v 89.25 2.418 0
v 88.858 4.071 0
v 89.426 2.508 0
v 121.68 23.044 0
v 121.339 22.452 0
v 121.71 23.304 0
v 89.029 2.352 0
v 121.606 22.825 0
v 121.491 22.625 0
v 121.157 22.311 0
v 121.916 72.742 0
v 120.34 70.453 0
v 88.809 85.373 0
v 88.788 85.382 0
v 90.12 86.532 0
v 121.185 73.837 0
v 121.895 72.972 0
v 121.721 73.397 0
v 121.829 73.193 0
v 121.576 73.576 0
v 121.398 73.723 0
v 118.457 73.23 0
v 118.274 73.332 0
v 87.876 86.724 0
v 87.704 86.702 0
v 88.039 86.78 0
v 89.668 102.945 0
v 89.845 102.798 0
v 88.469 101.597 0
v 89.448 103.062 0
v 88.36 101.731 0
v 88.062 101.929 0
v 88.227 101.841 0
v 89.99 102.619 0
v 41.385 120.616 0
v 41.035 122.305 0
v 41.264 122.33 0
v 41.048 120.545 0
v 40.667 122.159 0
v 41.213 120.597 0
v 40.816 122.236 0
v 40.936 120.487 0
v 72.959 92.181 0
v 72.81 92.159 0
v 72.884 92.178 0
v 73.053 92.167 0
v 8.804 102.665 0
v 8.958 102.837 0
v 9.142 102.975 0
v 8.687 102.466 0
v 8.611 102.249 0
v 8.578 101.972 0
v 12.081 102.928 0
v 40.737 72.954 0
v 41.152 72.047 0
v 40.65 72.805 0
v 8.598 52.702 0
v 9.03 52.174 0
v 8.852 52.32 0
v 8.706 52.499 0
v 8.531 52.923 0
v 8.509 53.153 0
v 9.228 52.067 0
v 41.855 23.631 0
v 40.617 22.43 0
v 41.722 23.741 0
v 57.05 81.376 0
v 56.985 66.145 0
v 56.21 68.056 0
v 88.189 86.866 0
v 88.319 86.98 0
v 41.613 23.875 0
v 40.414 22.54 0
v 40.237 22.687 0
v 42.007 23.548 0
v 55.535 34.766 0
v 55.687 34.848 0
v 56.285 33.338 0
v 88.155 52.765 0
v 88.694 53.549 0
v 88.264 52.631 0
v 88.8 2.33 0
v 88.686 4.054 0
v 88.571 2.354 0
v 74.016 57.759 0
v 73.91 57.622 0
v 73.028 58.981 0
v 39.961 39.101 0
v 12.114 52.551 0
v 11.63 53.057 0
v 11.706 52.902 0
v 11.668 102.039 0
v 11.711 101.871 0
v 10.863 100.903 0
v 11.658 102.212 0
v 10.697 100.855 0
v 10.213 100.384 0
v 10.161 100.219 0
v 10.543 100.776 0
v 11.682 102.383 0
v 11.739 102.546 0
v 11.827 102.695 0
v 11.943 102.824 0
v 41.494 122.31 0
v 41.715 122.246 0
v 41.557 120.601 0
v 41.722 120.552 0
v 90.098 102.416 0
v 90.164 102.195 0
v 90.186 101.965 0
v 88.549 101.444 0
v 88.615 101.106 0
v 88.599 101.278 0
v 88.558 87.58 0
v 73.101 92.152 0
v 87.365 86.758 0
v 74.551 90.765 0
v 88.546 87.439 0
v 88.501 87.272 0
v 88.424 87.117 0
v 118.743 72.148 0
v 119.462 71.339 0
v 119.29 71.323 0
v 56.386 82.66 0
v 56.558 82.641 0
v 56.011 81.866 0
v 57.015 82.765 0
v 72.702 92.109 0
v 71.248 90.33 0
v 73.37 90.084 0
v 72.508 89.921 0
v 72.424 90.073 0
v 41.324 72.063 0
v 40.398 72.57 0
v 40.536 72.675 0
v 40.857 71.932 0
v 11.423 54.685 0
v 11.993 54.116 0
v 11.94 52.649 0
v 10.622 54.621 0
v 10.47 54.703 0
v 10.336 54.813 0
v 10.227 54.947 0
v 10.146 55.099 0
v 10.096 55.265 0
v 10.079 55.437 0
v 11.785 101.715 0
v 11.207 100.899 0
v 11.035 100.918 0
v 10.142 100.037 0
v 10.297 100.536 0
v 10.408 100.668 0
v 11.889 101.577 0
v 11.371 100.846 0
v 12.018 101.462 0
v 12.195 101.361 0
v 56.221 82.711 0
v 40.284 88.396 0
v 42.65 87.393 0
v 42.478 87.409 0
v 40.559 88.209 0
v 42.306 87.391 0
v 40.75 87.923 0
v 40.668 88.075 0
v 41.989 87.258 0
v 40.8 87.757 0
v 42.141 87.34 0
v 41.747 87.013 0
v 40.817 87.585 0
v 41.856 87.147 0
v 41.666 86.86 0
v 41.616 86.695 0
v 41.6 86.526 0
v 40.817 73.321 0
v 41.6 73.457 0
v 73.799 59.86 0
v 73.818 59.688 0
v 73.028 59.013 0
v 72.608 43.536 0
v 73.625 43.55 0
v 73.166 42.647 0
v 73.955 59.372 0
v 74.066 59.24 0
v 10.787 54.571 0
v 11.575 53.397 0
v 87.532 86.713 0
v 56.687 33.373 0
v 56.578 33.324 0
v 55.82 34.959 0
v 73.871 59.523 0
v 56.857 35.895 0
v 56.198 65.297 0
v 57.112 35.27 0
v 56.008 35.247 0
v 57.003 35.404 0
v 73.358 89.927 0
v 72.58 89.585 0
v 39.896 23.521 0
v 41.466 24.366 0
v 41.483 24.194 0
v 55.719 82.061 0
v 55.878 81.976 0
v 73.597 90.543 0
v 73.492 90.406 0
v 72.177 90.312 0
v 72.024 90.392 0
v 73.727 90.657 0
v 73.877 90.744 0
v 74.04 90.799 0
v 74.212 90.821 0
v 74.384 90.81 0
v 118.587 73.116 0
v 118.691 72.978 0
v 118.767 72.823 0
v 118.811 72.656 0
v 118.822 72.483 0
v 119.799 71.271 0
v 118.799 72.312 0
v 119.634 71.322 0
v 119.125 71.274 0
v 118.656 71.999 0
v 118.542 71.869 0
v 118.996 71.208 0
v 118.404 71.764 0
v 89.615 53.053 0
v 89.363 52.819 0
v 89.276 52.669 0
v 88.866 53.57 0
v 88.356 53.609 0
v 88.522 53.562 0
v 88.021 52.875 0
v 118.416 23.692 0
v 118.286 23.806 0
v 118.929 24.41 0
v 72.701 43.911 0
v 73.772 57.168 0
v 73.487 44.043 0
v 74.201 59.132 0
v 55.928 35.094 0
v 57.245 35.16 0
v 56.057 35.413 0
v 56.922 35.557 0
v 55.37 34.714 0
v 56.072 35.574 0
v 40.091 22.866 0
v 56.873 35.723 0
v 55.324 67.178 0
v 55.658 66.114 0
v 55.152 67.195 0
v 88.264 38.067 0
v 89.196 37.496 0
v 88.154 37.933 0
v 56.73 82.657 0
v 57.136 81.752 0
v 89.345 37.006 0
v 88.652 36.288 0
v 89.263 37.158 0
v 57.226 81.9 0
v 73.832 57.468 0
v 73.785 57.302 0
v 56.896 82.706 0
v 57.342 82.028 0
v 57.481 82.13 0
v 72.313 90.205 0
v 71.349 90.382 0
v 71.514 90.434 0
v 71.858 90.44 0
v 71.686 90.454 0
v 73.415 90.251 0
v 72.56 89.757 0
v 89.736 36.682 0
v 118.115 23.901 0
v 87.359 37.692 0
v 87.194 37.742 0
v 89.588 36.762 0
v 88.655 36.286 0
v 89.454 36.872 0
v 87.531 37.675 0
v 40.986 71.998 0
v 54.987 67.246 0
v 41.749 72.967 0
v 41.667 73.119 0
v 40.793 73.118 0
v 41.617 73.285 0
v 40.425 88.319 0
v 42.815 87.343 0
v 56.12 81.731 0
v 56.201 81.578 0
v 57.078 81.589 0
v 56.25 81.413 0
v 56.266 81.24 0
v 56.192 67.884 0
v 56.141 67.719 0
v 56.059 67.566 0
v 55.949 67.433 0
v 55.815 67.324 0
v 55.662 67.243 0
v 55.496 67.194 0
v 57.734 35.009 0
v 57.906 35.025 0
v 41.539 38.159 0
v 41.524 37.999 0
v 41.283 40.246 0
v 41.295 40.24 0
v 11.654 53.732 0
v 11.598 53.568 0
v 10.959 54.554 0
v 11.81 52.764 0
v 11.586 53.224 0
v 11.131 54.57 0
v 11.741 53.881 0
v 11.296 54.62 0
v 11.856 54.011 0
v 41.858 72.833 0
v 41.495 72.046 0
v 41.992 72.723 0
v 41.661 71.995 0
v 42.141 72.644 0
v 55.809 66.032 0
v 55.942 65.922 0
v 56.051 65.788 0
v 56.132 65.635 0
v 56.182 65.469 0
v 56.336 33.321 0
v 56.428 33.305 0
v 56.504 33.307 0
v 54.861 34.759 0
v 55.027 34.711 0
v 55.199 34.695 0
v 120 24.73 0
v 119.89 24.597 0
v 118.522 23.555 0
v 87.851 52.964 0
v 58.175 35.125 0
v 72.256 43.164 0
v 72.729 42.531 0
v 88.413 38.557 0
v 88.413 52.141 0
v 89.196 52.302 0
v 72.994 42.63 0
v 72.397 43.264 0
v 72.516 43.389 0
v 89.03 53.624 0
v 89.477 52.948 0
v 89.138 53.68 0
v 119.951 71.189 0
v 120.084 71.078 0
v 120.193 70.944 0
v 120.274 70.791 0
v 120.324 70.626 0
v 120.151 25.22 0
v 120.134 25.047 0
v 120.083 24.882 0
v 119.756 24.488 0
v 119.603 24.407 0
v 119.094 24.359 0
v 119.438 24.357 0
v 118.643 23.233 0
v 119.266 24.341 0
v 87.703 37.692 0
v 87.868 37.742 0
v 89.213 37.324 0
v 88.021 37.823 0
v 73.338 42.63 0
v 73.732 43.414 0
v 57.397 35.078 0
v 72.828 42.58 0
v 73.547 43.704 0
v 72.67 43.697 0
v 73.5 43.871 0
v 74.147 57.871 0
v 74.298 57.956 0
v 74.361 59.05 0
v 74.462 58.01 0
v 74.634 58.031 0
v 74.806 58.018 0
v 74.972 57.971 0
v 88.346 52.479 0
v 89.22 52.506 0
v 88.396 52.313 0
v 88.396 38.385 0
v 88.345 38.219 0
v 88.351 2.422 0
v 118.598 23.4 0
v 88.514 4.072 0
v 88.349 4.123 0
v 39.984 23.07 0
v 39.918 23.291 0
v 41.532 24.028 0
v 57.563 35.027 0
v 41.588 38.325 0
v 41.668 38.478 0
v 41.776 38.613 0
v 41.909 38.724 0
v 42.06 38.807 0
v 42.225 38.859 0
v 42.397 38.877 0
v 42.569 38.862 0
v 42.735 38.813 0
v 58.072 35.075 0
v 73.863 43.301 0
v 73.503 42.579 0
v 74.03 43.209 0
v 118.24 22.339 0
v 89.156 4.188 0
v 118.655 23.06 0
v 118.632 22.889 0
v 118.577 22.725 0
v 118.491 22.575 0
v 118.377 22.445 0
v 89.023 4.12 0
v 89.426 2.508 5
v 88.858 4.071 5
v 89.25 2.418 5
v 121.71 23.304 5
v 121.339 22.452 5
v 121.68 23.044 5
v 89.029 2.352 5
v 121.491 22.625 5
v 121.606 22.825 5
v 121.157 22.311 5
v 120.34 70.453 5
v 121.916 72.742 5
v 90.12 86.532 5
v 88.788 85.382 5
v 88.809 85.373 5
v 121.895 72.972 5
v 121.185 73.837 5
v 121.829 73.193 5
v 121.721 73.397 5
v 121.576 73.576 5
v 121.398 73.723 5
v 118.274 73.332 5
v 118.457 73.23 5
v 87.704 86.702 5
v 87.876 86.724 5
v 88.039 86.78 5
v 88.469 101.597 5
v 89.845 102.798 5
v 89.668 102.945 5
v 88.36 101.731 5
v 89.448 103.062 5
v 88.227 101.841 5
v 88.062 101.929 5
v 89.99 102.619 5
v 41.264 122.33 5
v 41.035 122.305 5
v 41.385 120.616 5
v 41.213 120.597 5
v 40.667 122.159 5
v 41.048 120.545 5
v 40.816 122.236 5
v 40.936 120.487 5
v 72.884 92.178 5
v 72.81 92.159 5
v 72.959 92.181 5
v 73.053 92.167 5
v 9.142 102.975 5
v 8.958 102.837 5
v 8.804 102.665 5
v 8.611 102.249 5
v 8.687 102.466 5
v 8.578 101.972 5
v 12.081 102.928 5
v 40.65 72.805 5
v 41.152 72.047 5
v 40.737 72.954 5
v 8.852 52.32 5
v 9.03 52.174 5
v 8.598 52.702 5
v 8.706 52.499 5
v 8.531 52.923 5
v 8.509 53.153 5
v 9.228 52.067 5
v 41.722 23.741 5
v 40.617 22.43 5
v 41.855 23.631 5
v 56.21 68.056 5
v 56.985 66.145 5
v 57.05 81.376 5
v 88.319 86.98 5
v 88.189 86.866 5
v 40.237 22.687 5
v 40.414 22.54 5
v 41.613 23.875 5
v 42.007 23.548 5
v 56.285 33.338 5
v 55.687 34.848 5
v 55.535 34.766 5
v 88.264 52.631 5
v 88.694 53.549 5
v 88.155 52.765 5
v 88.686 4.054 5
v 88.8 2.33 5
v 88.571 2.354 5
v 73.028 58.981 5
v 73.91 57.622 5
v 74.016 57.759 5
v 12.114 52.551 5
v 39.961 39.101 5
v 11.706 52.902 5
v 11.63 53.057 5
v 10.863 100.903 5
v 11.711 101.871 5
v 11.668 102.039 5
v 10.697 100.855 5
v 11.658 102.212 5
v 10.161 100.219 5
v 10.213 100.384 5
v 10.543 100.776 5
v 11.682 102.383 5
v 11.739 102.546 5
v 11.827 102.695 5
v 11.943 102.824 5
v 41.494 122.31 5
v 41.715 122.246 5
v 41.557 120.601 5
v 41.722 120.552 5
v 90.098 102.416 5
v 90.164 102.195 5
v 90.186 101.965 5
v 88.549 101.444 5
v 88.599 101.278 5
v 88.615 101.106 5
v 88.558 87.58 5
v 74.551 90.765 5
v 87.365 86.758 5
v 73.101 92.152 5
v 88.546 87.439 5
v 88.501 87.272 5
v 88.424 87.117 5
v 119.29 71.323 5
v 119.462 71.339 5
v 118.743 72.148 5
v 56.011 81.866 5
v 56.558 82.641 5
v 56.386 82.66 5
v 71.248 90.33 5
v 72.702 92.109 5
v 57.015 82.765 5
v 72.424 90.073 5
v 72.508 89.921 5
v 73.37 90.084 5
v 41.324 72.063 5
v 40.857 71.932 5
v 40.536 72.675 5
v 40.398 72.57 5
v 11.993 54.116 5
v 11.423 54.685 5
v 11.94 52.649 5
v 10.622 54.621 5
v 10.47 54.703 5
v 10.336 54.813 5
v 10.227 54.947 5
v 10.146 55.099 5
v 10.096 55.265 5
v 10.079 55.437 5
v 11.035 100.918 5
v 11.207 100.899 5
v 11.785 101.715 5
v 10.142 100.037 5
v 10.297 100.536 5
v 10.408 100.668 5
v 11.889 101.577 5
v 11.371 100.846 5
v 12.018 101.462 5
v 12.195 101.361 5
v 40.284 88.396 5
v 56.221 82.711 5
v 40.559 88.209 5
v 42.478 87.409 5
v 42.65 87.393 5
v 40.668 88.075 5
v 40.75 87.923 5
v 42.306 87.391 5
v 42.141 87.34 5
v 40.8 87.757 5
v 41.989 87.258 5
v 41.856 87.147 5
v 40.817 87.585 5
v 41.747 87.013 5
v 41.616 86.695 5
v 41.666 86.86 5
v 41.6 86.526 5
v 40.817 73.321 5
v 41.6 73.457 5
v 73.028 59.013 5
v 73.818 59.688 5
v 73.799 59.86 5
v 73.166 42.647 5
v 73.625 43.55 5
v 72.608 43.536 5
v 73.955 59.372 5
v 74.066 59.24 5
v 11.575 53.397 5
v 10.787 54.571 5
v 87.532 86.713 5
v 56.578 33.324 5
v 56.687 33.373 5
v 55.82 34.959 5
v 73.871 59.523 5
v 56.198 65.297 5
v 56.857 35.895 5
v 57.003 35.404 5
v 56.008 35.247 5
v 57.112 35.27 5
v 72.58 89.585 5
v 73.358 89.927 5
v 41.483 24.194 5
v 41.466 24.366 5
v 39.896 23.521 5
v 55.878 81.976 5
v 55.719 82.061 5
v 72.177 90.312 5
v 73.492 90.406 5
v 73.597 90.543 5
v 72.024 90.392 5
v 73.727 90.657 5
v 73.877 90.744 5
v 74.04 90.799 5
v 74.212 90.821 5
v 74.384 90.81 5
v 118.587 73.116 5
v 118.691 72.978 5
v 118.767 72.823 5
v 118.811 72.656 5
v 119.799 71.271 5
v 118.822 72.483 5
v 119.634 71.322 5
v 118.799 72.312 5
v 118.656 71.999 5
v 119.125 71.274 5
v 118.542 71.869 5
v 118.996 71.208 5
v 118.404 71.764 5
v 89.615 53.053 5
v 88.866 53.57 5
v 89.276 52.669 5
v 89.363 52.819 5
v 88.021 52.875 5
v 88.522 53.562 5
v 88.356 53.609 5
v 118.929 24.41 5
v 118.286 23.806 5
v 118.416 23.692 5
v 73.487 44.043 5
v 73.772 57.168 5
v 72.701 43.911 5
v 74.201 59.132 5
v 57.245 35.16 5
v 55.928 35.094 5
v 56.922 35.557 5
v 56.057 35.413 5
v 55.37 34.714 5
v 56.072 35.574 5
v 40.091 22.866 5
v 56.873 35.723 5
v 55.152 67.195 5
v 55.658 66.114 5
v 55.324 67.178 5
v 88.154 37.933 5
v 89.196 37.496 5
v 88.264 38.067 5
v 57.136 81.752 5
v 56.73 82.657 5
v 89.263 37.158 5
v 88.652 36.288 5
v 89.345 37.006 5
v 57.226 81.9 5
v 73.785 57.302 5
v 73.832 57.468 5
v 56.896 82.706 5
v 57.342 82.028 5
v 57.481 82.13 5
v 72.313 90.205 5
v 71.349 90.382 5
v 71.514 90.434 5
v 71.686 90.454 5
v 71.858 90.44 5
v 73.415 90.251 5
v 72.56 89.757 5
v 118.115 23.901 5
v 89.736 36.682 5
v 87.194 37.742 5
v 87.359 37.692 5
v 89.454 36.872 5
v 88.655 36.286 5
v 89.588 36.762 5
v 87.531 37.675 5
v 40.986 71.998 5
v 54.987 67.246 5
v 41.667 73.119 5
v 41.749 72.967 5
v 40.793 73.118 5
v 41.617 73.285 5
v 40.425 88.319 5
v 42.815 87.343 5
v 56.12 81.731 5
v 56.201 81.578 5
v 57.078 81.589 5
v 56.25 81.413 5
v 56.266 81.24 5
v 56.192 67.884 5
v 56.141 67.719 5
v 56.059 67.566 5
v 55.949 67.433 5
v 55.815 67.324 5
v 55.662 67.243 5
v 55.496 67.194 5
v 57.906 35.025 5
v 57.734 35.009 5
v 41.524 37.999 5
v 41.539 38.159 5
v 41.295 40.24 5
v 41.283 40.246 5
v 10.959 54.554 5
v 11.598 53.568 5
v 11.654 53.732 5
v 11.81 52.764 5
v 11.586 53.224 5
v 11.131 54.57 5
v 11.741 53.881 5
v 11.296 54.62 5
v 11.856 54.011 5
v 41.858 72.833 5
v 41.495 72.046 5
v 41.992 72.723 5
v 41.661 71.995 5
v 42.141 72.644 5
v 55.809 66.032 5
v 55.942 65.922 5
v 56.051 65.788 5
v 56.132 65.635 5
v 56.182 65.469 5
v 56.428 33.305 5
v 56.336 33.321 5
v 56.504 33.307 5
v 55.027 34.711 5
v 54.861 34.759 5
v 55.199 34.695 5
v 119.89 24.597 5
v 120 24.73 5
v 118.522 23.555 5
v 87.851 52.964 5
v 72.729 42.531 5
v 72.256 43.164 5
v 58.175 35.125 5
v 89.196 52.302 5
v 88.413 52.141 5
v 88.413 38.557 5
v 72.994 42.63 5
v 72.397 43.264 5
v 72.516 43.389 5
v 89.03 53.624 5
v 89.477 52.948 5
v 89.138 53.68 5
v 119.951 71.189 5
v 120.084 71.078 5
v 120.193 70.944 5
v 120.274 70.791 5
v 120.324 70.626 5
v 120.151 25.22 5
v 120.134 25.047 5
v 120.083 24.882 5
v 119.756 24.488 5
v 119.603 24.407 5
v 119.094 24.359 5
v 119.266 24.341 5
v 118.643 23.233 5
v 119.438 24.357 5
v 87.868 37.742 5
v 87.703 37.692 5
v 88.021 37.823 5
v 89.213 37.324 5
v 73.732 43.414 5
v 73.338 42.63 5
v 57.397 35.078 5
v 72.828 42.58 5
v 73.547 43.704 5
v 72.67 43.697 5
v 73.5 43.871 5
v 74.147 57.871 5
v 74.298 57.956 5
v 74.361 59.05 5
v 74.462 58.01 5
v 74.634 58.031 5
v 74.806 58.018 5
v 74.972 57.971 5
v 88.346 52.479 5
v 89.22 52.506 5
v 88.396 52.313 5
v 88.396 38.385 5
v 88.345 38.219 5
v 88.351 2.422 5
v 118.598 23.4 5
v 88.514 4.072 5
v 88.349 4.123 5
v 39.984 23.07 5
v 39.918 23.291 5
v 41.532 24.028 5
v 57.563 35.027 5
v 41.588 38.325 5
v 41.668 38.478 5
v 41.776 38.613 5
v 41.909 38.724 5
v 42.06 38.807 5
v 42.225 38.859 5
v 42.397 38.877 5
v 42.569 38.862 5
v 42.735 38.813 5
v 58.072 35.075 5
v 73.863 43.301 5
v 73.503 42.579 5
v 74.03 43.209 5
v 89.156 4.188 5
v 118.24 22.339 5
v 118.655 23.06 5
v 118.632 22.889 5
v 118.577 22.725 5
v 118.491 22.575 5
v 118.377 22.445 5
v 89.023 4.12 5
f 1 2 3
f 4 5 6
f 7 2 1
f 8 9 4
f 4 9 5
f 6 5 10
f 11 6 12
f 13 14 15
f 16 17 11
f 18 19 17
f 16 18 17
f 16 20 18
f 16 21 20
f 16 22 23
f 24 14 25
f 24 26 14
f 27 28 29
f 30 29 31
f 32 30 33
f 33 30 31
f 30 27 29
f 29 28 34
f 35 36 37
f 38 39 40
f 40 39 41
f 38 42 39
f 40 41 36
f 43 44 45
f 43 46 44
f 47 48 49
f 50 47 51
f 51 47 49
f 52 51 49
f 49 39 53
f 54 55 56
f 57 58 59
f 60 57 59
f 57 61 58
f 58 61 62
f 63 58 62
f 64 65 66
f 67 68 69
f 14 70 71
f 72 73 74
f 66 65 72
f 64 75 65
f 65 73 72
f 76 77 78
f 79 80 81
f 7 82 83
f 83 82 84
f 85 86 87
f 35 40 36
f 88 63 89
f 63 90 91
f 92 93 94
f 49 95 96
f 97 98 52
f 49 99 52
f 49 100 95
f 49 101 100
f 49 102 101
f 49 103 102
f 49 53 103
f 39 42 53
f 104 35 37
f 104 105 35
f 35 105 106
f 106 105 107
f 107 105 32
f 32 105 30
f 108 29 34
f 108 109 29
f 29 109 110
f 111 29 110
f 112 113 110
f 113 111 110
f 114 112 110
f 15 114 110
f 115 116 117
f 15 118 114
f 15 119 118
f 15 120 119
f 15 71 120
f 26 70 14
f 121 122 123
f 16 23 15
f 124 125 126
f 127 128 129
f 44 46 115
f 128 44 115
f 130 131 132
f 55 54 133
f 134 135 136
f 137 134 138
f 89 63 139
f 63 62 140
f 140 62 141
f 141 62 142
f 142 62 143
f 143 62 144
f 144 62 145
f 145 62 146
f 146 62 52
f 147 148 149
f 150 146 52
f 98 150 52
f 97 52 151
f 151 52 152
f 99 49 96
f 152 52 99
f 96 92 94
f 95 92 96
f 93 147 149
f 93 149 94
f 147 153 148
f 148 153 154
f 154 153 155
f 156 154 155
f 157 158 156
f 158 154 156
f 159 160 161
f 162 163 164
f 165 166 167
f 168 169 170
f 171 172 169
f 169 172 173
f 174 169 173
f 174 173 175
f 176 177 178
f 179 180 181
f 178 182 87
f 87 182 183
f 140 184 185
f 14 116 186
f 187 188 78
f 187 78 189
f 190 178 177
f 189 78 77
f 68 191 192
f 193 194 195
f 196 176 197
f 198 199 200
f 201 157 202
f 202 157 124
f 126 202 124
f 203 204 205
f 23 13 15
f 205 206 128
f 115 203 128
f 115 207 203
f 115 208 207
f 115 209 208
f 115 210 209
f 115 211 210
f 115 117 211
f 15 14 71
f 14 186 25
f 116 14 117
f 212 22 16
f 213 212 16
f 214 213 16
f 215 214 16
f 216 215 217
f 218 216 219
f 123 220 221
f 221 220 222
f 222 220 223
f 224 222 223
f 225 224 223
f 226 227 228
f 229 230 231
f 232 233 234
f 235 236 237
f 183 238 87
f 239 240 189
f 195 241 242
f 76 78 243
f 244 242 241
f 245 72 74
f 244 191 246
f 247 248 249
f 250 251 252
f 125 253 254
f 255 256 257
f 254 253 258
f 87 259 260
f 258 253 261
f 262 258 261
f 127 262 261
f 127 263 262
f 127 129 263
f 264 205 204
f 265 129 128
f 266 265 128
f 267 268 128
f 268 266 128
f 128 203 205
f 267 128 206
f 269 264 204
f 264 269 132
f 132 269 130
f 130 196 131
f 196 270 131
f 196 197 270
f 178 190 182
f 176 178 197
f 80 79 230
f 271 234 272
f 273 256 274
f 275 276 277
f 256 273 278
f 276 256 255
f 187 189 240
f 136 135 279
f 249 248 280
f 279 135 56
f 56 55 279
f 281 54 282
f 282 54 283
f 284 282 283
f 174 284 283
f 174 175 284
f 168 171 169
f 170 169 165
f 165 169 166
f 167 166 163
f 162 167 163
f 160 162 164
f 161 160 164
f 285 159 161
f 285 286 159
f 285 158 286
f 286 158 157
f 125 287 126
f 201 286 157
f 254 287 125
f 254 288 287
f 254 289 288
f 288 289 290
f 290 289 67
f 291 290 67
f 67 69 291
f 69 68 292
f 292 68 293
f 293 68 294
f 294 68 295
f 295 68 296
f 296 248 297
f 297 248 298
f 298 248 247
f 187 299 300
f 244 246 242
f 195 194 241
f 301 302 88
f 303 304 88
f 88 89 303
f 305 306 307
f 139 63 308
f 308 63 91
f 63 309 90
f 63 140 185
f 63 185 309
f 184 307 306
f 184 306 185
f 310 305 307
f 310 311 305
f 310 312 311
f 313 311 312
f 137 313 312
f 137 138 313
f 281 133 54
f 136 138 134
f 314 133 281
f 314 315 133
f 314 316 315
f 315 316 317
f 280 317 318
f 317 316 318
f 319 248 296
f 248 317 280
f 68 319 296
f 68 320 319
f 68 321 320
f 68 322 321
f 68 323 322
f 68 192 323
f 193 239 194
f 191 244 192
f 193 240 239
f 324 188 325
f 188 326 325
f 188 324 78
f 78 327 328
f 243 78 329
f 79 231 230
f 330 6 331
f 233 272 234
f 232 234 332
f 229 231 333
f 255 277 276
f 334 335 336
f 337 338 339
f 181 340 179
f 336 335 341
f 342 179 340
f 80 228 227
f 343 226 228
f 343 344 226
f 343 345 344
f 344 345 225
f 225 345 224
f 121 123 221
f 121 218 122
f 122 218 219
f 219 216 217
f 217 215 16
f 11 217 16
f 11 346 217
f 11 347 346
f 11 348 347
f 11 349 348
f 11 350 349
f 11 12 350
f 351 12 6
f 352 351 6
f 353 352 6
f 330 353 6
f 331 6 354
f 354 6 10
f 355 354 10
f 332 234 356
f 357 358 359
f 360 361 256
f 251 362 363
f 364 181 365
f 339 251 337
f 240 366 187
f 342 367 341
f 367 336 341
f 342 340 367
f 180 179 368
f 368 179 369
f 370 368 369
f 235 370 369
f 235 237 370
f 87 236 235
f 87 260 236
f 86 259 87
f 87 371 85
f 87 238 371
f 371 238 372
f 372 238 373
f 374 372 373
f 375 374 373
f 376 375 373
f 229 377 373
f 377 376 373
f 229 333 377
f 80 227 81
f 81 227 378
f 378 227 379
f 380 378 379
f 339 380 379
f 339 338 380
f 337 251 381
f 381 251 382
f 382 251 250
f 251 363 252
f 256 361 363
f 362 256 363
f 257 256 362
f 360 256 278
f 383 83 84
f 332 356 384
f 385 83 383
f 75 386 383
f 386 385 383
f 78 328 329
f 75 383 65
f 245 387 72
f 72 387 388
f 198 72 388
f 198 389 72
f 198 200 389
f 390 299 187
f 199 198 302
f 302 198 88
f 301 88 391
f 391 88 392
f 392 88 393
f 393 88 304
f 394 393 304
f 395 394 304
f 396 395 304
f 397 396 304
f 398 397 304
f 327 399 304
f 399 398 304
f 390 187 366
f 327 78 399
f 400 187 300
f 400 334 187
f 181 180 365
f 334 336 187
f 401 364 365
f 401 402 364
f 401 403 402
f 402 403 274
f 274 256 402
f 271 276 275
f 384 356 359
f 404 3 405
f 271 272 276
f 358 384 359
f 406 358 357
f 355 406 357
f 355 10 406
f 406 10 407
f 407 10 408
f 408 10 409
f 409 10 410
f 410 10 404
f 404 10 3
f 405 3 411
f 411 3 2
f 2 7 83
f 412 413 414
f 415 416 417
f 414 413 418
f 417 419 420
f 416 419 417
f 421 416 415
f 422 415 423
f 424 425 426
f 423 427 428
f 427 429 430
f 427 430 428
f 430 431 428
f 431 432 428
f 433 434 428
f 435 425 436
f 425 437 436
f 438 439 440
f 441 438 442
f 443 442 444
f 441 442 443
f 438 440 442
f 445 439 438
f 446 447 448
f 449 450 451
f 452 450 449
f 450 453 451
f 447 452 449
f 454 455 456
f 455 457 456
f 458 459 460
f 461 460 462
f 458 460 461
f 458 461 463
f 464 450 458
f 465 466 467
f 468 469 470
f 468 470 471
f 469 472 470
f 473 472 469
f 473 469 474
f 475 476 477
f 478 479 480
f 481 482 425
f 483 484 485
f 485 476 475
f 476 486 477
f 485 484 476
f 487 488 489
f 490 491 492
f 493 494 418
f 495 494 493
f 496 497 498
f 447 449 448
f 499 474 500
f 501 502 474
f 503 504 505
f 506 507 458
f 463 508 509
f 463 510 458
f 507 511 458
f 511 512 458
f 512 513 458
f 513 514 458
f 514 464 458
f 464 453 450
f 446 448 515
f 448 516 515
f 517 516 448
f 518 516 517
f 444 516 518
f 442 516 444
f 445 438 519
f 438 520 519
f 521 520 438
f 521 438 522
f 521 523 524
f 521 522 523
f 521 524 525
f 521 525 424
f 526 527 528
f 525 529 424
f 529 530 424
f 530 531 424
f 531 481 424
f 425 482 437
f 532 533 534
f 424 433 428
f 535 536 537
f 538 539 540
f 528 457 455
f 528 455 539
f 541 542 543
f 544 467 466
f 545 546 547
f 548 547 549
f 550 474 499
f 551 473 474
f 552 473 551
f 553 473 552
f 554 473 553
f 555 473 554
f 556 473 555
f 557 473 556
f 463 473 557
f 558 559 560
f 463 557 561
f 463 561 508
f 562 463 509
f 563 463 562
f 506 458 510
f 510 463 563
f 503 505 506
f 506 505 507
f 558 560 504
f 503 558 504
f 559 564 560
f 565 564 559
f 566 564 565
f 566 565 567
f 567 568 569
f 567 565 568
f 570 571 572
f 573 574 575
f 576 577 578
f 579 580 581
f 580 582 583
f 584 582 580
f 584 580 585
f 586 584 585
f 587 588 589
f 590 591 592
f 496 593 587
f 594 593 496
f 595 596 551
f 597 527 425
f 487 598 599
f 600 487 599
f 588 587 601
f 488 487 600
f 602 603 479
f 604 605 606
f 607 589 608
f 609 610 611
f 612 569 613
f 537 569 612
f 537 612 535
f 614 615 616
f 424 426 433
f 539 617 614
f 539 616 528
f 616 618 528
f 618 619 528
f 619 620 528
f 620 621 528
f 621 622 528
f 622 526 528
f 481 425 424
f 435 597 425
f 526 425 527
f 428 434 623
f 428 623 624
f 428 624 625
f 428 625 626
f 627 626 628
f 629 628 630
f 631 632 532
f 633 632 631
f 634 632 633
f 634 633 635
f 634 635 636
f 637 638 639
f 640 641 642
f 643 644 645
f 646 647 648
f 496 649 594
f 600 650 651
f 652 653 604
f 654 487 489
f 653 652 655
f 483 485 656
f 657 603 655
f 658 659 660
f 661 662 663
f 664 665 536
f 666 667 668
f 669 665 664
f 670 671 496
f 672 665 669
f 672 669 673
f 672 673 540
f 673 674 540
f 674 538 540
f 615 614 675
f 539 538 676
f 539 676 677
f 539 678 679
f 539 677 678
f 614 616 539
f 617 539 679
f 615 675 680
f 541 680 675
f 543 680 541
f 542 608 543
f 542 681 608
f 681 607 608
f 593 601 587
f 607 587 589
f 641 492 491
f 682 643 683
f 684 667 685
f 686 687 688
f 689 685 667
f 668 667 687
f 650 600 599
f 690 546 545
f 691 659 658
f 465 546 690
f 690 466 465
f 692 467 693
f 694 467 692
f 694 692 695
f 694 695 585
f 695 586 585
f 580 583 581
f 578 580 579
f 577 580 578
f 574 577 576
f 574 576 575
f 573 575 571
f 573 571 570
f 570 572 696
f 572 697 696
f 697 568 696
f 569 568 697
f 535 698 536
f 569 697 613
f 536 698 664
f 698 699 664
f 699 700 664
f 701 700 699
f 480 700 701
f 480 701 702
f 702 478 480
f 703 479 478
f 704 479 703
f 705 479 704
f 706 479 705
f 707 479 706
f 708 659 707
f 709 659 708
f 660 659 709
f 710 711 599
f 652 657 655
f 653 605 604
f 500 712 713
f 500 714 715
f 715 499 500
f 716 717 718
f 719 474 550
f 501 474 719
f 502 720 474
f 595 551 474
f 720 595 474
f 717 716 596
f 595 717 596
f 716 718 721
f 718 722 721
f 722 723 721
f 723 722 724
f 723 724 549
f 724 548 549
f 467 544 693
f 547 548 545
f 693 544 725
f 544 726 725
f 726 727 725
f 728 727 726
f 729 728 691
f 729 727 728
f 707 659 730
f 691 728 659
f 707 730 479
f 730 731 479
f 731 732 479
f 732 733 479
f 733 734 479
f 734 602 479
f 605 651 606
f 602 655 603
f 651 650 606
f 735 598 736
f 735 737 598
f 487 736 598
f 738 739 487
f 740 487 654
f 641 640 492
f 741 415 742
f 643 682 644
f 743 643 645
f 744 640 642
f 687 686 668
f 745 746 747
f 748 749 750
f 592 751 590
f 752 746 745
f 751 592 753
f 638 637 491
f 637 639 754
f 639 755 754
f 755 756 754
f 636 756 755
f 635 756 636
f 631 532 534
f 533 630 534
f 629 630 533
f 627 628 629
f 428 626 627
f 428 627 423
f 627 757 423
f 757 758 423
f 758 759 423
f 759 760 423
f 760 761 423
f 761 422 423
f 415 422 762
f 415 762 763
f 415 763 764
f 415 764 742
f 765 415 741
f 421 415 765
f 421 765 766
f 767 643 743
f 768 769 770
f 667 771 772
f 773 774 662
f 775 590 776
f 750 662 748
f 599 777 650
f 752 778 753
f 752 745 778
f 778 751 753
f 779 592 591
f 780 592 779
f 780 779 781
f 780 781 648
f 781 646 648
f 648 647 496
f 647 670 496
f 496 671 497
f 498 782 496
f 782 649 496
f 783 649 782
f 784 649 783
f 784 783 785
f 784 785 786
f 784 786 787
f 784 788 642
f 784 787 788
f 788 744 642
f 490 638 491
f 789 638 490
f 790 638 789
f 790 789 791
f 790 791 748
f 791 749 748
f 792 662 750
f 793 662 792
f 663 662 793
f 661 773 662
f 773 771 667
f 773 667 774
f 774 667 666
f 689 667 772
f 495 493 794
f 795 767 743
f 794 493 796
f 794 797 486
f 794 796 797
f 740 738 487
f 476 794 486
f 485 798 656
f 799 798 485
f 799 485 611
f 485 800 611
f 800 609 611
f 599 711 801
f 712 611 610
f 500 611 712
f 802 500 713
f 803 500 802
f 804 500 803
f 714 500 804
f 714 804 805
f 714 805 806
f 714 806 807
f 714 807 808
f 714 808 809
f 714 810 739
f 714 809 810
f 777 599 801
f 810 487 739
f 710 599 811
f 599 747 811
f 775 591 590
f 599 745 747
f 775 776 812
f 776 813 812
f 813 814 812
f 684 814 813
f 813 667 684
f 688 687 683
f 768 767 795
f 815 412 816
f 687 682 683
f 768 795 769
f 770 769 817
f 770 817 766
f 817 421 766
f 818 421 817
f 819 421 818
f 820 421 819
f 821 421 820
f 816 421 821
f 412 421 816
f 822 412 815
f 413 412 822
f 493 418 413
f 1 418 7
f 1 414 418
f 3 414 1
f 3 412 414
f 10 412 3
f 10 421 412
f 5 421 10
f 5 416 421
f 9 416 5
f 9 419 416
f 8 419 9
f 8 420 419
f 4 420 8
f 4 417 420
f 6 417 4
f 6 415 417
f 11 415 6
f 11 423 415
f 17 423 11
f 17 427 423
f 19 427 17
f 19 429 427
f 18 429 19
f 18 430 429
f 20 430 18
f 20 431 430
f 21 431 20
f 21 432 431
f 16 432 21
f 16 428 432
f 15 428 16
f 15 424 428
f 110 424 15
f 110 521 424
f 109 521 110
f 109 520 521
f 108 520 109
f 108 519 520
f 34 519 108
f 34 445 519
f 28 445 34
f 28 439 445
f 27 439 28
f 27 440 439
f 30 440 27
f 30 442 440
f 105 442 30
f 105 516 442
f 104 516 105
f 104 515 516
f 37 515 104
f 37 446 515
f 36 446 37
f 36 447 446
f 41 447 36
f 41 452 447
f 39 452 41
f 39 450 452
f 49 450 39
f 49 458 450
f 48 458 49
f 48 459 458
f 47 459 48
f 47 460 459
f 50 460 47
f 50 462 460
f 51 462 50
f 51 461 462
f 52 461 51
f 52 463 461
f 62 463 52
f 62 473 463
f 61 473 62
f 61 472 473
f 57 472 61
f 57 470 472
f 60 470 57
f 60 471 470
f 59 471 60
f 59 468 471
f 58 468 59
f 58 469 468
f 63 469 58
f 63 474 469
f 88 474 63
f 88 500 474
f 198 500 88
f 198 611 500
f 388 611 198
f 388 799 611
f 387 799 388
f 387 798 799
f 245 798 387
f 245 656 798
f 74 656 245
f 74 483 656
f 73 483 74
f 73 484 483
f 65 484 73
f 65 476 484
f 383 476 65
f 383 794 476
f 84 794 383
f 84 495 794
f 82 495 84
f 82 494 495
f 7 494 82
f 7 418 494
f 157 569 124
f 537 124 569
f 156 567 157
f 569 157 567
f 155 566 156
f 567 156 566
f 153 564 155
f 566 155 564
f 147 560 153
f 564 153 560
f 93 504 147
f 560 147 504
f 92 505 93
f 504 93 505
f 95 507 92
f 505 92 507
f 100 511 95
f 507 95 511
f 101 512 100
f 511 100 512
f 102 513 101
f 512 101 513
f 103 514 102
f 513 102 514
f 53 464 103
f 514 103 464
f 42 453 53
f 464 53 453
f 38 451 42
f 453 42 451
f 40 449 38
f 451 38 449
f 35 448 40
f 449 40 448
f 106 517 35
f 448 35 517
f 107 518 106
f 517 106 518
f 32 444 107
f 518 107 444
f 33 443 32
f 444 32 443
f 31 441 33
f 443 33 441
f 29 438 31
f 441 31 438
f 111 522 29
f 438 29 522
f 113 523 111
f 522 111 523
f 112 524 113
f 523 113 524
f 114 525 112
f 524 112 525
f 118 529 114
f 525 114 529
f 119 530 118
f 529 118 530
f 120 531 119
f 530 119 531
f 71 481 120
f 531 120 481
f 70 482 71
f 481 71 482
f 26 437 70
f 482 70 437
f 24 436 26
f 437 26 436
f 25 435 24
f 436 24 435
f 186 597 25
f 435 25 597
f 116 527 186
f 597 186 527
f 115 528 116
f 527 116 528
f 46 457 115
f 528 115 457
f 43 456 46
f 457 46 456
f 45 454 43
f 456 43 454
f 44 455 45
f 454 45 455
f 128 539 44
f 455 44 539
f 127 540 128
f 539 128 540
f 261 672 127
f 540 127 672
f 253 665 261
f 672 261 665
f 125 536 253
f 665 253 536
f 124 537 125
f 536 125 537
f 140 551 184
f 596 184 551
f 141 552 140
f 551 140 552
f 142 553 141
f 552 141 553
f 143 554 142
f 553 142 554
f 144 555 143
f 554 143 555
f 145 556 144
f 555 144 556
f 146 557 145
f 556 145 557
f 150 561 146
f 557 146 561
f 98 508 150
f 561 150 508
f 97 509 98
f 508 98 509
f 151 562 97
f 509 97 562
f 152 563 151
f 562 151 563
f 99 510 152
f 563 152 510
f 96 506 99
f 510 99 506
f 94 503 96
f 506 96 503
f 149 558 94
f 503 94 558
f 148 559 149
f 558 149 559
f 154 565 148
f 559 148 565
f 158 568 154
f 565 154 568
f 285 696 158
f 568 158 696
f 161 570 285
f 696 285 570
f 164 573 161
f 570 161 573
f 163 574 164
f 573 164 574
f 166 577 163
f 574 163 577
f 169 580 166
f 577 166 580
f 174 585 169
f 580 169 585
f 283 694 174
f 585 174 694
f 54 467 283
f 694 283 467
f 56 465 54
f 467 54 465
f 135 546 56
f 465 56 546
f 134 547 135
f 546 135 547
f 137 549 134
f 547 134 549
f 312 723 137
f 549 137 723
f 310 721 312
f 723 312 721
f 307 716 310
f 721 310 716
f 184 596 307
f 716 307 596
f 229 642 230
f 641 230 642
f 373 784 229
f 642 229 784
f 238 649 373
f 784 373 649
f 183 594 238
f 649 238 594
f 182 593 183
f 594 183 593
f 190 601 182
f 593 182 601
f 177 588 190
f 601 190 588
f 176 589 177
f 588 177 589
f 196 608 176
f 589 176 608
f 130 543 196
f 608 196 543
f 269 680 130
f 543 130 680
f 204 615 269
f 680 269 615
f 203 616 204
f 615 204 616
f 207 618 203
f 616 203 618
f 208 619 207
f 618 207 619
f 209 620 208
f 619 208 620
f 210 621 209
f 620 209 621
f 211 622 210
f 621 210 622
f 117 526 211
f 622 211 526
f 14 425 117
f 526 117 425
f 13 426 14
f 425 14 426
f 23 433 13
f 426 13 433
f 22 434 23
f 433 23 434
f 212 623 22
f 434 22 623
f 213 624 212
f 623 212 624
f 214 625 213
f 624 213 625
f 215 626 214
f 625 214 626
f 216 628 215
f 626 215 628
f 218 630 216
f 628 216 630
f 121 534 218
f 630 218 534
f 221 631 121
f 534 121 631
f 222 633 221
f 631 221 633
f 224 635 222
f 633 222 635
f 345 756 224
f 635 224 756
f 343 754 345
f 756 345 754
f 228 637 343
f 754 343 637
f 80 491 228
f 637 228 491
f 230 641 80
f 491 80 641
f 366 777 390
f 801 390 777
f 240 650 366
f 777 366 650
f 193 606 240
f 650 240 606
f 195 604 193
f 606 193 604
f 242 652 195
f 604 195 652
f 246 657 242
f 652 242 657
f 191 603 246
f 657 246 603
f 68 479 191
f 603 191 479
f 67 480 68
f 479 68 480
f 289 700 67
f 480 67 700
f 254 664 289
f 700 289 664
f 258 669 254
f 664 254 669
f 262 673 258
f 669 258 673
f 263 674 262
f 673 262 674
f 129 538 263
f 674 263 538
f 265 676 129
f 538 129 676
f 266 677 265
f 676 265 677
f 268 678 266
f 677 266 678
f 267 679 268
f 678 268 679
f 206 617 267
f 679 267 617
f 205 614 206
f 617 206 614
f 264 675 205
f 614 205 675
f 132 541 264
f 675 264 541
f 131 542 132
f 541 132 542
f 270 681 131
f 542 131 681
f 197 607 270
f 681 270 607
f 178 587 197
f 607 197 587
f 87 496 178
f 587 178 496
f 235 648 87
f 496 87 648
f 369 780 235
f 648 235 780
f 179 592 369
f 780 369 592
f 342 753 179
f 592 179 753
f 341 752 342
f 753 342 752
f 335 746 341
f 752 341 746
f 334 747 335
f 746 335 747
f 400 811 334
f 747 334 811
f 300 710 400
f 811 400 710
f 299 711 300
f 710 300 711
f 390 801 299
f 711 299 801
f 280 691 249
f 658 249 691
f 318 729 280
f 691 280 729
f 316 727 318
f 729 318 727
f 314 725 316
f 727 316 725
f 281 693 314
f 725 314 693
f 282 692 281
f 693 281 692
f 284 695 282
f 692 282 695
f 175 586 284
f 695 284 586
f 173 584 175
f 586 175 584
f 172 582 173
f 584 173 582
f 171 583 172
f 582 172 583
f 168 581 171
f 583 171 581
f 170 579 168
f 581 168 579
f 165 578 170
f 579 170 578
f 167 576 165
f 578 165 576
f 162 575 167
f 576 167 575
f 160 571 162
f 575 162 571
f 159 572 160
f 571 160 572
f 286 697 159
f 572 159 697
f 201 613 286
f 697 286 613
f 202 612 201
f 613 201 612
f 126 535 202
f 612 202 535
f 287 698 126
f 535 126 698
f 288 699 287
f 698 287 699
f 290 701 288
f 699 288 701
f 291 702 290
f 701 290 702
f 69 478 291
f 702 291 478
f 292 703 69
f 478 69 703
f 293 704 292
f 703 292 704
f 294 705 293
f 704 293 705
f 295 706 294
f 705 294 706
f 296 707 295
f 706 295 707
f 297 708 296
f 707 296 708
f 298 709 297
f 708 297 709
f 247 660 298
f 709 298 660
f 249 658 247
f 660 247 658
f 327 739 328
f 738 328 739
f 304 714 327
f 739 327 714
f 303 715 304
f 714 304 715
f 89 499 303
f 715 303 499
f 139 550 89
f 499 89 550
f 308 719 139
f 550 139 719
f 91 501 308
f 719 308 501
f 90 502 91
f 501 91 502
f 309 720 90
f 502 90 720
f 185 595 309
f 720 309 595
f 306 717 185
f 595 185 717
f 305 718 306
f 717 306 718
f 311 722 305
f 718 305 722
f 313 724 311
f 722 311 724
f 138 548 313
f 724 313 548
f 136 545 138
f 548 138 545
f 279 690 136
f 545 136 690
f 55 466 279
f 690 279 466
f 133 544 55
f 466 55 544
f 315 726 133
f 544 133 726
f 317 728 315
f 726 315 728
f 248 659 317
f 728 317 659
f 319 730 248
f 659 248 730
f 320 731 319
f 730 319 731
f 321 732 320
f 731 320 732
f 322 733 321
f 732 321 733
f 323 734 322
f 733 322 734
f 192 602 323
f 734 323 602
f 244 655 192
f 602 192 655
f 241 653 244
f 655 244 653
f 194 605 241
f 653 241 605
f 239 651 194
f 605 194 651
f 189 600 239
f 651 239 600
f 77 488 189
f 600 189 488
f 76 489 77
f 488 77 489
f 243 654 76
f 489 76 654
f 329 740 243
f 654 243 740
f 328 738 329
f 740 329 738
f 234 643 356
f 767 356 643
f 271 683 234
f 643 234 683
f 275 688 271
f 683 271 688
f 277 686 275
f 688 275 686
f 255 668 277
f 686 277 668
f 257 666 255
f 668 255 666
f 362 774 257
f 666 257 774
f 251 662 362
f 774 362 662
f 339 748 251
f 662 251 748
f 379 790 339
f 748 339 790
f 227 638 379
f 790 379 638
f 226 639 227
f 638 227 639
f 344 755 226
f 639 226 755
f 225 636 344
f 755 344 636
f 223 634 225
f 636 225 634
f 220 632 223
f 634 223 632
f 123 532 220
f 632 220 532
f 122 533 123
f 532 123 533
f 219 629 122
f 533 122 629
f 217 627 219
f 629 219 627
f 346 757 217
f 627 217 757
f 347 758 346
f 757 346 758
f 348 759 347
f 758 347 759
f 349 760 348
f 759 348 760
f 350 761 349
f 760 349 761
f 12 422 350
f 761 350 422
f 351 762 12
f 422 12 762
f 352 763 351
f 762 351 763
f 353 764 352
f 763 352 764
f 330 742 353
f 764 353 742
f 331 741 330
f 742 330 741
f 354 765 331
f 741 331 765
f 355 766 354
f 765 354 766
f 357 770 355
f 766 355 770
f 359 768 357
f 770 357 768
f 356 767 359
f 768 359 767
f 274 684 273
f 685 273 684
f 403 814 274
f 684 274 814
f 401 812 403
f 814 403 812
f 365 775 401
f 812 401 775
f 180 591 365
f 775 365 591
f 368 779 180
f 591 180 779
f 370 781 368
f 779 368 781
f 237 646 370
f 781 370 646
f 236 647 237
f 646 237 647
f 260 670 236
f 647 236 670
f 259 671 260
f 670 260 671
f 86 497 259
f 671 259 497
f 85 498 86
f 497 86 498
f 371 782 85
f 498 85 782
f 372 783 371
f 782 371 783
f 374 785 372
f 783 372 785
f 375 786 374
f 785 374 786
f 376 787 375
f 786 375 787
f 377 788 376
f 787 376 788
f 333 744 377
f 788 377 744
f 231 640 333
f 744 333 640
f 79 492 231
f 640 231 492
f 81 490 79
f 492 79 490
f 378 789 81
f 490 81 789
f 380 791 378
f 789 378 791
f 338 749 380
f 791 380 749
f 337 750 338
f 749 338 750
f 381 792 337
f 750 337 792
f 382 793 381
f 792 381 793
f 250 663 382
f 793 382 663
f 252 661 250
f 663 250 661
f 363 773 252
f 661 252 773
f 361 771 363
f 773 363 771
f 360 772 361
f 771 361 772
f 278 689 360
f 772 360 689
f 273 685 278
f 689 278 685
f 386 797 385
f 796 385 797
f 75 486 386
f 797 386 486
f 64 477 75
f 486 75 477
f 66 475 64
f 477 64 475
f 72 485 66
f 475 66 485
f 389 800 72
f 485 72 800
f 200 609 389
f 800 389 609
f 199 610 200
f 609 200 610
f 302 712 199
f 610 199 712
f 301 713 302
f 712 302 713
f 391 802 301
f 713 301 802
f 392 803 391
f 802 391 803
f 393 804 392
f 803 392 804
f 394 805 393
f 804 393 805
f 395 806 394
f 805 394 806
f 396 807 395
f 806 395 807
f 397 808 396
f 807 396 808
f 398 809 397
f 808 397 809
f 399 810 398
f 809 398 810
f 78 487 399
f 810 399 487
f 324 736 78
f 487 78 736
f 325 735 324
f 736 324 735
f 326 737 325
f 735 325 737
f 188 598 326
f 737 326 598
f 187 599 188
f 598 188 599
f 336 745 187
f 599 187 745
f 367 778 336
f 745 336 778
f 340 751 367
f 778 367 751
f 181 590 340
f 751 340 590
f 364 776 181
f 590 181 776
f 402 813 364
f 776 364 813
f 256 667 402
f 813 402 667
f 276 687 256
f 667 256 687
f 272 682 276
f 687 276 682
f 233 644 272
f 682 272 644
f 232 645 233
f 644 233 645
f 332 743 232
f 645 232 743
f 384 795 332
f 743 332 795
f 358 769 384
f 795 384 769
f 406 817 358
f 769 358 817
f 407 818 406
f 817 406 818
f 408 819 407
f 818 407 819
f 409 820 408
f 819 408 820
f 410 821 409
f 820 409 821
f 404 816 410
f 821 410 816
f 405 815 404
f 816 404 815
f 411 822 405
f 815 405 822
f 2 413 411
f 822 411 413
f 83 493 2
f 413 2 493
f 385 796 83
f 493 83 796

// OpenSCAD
/*
 * Customizable Geometry - Two Boxes https://www.thingiverse.com/thing:2776180
 * by Dennis Hofmann - https://www.thingiverse.com/mightynozzle/about
 * created 2018-01-31
 * version v1.0
 *
 * Changelog
 * --------------
 * v1.0:
 *      - final design
 * --------------
 * 
 * This work is licensed under the Creative Commons - Attribution - NonCommercial - ShareAlike license.
 * https://creativecommons.org/licenses/by-nc-sa/3.0/
 */


 // Parameter Section //
//-------------------//

// preview[view:north, tilt:top]

// The maximum size of the longest side. The shorter side will be automatically resized in same ratio.
max_size_in_millimeter = 120; //[20:300]

// The height of the model.
model_height_in_millimeter = 5; //[0.2:0.2:100]

// Thickness of the outer outline.
outline_size_in_millimeter = 1.6; //[0.5:0.1:20]

// Thickness of the inner outline.
inline_size_in_millimeter = 0.8; //[0.5:0.1:20]

// Roundiness of the ends of the inner outlines.
inline_edge_radius_in_millimeter = 0.9; //[0.0:0.1:5]

// Flip model
flip_model = "no"; //[yes,no]

/*[hidden]*/
max_size = max_size_in_millimeter;
model_height = model_height_in_millimeter;
$fn=32;

// Outer Points
A1 = [599, 580];
A2 = [598, 342];
A3 = [1293, 51];
A4 = [1755, 339];
A5 = [1758, 1058];
A6 = [1295, 1247];
A7 = [1296, 1483];
A8 = [601, 1762];
A9 = [142, 1483];
A10 = [141, 773];

outline = [A1, A2, A3, A4, A5, A6, A7, A8, A9, A10];

// Inner Points
B1 = [600, 1056];
B2 = [825, 1194];
B3 = [822, 490];
B4 = [1064, 628];
B5 = [1293, 771];
B6 = [1062, 1335];
B7 = [1293, 533];
B8 = [824, 962];
B9 = [1069, 858];
B10 = [600, 1286];

// Polygons
C1 = [A1, A2, A3, A4, B7, B4, B3];
C2 = [B4, B7, B5, B9];
C3 = [B7, A4, A5, B5];
C4 = [B5, A5, A6, B6, B9];
C5 = [B3, B4, B9, B6, B2, B8];
C6 = [B8, B1, B10, B2];
C7 = [B8, B3, A1, A10, B1];
C8 = [A10, A9, B10, B1];
C9 = [B2, B6, A6, A7, A8, A9];

cut_polygons = [C1, C2, C3, C4, C5, C6, C7, C8, C9];

min_x = A10[0];
min_y = A3[1];
max_x = A5[0];
max_y = A8[1];

x_size = max_x - min_x;
y_size = max_y - min_y;

x_factor = max_size / x_size;
y_factor = max_size / y_size;

inline_size = x_size > y_size ? inline_size_in_millimeter / x_factor / 2: inline_size_in_millimeter / y_factor / 2;
inline_edge_radius = x_size > y_size ? inline_edge_radius_in_millimeter / x_factor: inline_edge_radius_in_millimeter / y_factor;
outline_size = x_size > y_size ? outline_size_in_millimeter / x_factor - inline_size: outline_size_in_millimeter / y_factor - inline_size;


 // Program Section //
//-----------------//

if(x_size > y_size) {
    resize(newsize=[max_size, x_factor * y_size, model_height]){
        if(flip_model == "yes") {
            mirror([0,1,0]) {
                rotate([180,180,0]) {    
                    create(outline, cut_polygons);
                }
            }
        } else {
            create(outline, cut_polygons);
        }
    }
} else {
    resize(newsize=[y_factor * x_size, max_size, model_height]){
        if(flip_model == "yes") {
            mirror([0,1,0]) {
                rotate([180,180,0]) {    
                    create(outline, cut_polygons);
                }
            }
        } else {
            create(outline, cut_polygons);
        }
    }
}


 // Module Section //
//----------------//

module create() {
    linear_extrude(height=1) {
        difference() {
            offset(r = -0) {
                offset(r = +outline_size) {
                    polygon(points = outline, convexity = 10);
                }
            }
            
            for(cut_polygon = [0:len(cut_polygons)]) {
                offset(r = +inline_edge_radius) {
                    offset(r = -inline_size - inline_edge_radius) {
                        polygon(points = cut_polygons[cut_polygon], convexity = 10);
                    }
                }
            }
        }
    }
}
